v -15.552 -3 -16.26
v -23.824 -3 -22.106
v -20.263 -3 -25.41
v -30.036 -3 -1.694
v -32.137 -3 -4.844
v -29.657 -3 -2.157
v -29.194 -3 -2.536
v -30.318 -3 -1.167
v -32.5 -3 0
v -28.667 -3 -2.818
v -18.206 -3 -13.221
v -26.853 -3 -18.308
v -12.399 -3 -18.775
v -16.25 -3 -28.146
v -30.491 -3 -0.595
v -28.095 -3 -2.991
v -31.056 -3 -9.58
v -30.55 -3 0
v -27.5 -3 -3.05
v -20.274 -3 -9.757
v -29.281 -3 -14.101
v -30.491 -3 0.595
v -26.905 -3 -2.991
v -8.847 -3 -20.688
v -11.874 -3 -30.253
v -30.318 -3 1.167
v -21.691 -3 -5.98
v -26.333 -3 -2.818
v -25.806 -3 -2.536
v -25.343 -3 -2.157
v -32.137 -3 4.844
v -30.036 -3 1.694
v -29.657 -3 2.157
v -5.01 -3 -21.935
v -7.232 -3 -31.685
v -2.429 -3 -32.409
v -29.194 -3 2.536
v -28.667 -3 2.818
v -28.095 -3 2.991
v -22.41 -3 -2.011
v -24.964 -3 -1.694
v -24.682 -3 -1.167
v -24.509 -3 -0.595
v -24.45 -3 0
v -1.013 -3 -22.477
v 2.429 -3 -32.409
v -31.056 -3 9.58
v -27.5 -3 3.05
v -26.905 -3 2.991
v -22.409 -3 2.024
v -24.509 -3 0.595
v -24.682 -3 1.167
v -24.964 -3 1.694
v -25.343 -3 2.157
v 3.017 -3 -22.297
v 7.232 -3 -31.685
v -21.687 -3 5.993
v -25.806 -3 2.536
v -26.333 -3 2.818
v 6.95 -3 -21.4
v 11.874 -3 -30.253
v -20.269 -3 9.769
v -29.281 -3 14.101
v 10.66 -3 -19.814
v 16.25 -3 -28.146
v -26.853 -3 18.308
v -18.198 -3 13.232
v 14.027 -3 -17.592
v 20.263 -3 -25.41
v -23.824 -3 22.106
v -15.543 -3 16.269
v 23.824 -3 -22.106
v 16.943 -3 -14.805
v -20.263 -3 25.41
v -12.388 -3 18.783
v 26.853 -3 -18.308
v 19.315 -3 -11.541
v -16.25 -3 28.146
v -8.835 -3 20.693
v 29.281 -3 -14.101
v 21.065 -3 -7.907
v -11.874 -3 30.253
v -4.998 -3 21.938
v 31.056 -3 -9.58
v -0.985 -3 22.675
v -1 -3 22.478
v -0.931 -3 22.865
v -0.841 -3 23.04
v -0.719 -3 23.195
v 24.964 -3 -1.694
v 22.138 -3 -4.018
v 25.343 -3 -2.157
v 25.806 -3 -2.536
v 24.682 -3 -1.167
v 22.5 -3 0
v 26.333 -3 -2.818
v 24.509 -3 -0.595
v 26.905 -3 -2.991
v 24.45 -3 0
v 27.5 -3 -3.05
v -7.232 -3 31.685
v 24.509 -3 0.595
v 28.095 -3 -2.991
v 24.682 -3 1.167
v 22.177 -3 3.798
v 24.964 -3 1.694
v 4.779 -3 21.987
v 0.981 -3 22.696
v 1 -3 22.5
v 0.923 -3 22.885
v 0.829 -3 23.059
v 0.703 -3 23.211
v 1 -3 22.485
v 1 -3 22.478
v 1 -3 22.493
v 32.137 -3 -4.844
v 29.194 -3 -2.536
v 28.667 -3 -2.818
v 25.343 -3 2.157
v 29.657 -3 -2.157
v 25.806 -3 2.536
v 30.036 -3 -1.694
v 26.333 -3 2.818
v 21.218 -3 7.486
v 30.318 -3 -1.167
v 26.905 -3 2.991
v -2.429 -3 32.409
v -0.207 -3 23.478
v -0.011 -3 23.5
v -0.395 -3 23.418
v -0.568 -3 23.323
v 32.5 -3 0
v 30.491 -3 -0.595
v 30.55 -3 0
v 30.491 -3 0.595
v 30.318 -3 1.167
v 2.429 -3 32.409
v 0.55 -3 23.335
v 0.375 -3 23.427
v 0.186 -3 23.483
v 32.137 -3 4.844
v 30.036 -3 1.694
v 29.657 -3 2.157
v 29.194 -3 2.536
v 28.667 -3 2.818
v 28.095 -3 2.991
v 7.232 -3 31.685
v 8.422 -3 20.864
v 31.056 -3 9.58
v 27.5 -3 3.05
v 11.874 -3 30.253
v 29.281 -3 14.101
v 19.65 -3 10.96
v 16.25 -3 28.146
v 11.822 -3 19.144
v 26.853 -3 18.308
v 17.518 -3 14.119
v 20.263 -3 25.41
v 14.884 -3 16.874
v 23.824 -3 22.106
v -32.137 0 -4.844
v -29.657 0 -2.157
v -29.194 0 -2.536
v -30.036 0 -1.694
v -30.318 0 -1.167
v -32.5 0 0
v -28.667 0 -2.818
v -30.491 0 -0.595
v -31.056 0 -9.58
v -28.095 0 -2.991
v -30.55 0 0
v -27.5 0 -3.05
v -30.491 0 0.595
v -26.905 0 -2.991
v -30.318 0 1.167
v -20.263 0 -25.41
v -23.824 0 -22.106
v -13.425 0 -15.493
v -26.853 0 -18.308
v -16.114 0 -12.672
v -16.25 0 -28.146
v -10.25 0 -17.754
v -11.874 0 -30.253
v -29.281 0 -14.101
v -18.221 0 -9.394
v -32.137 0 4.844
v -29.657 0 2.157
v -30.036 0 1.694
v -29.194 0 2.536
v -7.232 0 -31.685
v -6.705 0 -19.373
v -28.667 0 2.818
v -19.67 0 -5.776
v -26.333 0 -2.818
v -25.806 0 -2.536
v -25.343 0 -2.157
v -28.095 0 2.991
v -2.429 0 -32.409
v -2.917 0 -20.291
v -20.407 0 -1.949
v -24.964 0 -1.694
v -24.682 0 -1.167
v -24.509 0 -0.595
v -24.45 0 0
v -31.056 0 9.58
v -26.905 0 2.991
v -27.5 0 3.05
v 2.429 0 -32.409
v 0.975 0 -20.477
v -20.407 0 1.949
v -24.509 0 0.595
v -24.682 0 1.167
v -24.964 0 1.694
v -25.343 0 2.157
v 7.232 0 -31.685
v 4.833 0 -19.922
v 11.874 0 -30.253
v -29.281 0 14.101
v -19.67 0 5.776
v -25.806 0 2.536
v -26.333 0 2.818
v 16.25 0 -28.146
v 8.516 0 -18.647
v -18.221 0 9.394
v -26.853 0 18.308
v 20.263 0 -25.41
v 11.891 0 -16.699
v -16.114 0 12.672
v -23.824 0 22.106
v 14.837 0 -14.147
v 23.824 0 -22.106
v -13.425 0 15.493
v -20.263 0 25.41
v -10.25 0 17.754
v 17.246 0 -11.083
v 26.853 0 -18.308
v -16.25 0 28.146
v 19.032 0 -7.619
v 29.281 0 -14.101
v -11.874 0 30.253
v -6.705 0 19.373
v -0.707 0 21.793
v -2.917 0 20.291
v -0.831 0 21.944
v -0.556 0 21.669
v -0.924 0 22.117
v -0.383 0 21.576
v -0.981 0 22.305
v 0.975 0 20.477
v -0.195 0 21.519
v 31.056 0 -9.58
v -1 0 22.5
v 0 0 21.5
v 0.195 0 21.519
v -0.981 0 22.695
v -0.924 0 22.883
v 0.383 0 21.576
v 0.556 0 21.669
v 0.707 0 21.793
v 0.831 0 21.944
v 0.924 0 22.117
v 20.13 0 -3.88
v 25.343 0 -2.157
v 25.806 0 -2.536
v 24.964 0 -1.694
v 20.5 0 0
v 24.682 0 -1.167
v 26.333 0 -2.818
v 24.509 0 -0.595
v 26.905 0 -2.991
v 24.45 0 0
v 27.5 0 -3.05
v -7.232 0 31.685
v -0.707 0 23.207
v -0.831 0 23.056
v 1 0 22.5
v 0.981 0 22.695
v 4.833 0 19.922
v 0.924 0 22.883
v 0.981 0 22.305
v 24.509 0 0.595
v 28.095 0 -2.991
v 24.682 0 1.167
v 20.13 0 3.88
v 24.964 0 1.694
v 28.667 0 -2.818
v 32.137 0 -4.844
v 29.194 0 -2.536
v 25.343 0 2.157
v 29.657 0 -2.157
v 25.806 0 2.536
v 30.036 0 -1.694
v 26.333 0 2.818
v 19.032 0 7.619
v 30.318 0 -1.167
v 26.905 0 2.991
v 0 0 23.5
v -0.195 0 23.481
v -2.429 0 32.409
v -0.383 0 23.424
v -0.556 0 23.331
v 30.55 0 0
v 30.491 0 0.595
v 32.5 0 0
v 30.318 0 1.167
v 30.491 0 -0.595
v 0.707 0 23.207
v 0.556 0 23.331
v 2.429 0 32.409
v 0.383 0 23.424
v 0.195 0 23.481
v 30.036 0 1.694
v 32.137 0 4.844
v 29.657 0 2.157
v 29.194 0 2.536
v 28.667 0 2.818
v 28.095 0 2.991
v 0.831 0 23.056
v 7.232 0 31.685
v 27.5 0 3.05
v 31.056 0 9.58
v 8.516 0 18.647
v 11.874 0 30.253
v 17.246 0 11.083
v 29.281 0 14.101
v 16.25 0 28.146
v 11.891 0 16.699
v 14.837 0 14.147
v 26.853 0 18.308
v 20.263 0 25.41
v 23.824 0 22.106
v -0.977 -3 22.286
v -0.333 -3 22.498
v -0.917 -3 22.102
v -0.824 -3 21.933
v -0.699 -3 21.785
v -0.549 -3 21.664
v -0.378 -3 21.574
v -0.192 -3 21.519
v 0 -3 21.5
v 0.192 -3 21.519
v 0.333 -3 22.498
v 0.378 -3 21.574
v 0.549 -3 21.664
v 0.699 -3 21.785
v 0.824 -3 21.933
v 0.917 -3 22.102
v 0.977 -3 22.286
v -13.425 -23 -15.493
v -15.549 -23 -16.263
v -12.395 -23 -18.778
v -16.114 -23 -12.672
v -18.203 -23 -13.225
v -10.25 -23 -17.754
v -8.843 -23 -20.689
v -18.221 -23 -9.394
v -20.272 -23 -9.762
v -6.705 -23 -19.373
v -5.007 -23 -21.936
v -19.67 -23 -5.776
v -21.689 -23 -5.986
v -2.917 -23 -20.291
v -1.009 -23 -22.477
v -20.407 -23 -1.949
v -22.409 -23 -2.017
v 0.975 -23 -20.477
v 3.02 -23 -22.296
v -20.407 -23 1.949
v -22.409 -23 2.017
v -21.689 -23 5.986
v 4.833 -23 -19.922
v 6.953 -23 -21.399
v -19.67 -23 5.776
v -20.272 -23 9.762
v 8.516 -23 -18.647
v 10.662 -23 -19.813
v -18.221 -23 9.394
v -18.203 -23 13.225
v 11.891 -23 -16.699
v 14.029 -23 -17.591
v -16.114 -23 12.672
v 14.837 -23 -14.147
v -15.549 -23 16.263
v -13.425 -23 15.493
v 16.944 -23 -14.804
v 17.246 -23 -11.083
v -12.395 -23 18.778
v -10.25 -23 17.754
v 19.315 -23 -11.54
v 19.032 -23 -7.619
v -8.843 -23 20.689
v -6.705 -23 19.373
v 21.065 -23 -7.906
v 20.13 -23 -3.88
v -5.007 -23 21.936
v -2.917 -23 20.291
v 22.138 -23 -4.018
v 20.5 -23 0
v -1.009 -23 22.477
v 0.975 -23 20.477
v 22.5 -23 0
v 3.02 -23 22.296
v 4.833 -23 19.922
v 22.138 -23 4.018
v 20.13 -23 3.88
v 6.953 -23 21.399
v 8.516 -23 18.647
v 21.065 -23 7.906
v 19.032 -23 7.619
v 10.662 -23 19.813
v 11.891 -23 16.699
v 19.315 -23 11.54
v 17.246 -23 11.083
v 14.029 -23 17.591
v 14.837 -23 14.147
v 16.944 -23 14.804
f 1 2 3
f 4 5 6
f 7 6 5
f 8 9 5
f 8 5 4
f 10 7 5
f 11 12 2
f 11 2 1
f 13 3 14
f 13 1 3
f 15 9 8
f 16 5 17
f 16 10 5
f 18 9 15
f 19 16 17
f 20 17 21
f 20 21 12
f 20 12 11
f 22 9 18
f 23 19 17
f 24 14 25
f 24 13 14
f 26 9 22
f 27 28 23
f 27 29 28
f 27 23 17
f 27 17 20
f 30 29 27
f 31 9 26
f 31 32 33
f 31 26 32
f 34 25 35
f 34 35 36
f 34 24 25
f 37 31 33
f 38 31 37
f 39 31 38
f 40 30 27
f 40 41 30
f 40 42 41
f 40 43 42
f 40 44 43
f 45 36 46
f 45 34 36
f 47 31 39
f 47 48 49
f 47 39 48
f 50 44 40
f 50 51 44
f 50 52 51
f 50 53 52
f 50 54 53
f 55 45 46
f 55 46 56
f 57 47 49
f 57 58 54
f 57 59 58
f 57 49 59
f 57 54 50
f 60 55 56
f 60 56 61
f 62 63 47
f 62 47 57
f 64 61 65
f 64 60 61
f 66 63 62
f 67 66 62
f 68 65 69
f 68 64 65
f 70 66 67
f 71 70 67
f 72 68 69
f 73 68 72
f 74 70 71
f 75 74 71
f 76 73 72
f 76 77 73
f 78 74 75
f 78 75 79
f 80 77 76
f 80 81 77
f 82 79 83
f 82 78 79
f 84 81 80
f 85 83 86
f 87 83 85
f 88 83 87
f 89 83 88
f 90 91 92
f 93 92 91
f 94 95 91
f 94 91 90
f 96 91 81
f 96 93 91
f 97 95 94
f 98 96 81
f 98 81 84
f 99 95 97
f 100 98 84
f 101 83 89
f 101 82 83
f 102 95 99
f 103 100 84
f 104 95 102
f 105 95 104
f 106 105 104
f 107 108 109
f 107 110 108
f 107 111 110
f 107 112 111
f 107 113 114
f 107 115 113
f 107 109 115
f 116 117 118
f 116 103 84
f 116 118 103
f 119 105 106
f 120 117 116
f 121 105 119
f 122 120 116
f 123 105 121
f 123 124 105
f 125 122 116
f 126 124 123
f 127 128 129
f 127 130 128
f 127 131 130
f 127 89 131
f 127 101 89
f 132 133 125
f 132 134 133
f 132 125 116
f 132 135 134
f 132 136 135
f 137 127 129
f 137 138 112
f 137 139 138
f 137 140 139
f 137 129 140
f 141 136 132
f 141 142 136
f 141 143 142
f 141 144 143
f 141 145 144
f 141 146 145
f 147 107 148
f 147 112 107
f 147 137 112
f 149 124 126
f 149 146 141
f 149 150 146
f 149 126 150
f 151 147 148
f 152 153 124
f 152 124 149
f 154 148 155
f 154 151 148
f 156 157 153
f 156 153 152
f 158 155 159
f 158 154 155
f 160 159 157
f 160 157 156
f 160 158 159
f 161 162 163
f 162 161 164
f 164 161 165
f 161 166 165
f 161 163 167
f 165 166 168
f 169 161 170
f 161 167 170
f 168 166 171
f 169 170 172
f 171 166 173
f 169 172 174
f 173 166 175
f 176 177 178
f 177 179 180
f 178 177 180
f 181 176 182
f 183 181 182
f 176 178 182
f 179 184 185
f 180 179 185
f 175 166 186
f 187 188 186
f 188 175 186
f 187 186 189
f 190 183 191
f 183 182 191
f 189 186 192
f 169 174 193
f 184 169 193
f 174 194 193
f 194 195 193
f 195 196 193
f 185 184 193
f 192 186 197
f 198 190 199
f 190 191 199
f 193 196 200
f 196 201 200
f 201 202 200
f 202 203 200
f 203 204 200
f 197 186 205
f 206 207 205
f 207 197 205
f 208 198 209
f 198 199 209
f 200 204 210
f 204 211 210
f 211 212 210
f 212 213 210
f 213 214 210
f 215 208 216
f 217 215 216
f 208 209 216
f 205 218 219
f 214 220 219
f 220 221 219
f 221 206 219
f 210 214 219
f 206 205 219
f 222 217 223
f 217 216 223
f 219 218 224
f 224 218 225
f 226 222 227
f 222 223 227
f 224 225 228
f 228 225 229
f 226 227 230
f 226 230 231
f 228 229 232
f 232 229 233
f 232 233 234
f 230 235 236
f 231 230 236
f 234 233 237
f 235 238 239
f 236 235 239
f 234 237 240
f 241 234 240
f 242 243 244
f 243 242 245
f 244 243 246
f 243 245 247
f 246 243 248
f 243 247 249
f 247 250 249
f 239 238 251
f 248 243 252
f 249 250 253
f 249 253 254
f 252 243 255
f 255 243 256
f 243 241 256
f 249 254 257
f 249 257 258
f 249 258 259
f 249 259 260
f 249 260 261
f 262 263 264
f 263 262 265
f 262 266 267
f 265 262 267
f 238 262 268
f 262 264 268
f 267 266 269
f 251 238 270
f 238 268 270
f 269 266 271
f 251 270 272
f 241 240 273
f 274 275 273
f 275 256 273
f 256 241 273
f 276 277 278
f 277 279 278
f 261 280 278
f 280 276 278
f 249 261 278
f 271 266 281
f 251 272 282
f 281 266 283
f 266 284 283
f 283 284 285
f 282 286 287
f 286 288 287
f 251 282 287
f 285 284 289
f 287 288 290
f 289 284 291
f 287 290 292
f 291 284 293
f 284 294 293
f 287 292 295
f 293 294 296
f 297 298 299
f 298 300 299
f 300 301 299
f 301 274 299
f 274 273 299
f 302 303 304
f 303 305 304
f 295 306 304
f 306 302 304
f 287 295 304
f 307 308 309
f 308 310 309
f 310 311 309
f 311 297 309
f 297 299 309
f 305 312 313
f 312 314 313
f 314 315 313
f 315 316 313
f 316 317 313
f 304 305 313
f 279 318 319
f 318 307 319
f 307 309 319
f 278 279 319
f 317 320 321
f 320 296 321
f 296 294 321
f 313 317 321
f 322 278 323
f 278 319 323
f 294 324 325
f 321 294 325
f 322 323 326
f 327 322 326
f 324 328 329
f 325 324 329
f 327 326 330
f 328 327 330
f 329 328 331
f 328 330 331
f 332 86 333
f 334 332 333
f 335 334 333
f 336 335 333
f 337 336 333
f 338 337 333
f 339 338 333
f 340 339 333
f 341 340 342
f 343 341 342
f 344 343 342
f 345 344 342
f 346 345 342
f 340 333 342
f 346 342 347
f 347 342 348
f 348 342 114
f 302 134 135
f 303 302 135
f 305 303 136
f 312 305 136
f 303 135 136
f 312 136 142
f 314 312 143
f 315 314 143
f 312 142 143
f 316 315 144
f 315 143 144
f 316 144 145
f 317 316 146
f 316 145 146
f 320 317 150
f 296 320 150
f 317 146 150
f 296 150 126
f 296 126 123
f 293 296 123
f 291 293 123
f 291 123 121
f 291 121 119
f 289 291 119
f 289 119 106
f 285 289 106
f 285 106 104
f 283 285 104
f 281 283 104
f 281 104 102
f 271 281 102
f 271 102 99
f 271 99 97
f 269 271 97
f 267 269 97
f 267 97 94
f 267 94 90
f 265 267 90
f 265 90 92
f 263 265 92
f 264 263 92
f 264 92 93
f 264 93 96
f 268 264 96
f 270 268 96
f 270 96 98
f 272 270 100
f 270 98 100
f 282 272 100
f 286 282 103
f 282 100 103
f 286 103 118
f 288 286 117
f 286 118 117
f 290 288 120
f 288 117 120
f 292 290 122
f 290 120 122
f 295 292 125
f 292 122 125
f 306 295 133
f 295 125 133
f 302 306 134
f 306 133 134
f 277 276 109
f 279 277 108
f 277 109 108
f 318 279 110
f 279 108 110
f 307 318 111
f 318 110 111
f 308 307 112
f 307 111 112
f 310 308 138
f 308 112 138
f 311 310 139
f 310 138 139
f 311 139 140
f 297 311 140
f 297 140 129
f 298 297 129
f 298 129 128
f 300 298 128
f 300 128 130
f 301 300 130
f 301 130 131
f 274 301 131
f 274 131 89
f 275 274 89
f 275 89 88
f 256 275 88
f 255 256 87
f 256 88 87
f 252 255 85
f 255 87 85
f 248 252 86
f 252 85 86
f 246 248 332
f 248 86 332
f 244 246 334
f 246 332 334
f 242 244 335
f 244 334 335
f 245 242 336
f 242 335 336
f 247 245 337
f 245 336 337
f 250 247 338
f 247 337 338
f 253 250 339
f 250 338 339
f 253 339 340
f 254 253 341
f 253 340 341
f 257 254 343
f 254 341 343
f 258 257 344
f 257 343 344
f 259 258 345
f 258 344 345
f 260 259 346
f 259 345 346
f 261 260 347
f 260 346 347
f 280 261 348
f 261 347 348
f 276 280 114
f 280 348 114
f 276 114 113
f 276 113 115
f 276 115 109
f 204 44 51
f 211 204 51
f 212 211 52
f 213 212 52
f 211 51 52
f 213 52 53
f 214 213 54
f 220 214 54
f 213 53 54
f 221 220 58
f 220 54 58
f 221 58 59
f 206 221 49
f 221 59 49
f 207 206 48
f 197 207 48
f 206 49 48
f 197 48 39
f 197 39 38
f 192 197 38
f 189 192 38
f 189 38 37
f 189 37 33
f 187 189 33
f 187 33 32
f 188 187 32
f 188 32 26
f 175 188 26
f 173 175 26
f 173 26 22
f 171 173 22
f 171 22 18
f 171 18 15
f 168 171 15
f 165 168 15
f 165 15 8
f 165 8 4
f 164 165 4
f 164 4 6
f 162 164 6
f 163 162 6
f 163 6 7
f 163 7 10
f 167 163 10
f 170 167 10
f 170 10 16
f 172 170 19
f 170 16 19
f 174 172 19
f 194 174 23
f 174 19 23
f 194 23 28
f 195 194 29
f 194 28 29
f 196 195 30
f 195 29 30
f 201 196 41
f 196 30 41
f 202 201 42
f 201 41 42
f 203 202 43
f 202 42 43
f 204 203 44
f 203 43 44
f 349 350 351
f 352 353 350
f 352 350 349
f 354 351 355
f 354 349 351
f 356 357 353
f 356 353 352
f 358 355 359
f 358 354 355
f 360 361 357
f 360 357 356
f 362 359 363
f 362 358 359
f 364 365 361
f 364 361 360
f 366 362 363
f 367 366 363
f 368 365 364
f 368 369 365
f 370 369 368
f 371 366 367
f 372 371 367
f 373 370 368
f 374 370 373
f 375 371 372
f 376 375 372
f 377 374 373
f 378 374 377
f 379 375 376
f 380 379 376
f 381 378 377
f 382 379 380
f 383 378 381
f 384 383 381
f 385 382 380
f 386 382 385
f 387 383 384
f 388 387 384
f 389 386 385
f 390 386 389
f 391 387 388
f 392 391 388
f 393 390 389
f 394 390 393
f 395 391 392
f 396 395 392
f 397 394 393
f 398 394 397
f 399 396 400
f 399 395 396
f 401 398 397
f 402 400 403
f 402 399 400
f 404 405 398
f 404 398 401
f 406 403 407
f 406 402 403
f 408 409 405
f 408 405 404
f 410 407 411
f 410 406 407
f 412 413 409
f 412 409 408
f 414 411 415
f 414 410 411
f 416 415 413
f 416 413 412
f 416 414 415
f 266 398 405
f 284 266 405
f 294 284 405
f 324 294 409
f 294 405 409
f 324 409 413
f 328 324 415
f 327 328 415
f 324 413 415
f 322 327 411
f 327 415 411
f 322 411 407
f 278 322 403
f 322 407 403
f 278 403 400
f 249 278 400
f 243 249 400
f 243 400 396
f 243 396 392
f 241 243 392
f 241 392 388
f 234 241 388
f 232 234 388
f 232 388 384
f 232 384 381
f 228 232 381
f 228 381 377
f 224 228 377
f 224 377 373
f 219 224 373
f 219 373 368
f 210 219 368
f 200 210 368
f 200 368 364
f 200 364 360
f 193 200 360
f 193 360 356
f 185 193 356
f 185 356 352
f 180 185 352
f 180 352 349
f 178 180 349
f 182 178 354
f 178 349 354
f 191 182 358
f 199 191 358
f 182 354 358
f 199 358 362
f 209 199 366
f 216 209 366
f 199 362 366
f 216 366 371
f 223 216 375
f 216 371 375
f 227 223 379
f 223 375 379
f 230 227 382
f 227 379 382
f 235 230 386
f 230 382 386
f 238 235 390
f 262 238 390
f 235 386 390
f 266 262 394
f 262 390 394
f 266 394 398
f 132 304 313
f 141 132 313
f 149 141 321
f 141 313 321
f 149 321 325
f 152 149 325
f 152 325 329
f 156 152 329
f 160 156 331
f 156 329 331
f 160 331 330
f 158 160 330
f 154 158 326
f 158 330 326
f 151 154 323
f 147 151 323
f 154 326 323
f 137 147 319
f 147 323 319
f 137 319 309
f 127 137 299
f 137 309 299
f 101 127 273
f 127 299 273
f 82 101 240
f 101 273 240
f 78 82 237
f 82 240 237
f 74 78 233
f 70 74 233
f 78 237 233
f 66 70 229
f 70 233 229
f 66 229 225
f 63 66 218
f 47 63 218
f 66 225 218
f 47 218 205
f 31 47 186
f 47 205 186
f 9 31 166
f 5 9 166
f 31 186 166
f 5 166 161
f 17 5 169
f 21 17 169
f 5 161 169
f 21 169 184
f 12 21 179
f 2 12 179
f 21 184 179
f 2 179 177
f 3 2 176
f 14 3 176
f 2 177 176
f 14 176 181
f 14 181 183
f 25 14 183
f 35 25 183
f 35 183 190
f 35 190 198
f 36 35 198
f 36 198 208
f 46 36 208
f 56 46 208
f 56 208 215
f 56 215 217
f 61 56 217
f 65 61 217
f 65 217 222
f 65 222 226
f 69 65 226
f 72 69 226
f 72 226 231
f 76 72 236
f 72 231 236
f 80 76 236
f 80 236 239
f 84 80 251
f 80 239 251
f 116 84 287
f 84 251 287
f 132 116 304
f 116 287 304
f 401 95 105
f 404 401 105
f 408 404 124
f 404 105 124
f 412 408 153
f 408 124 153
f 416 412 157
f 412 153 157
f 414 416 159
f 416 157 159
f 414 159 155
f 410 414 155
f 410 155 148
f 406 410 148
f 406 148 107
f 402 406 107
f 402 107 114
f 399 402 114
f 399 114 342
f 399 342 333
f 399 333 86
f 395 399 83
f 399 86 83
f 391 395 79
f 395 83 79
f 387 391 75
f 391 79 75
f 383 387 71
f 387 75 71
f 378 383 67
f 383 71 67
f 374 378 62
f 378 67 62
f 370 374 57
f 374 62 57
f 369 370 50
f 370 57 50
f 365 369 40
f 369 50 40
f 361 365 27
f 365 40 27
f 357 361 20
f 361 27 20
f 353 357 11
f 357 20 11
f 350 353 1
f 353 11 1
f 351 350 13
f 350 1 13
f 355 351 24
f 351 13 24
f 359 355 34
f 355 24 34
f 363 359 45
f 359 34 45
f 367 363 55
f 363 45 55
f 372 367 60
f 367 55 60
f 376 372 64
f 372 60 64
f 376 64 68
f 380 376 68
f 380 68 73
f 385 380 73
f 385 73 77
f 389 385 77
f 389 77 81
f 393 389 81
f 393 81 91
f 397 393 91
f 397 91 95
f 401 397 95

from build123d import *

# Parameters (mm, degrees)
F0_R     = 32.5
F1_DEPTH = 3
F2_R     = 22.5
F3_DEPTH = 20
F4_R     = 20.5
F5_DEPTH = 23.001
F6_R     = 3.05
F6_R_2   = 1
F7_DEPTH = 3.001


with BuildPart() as f1:
    # F0 (on Front) → F1 (new body)
    with BuildSketch(Plane.XZ):
        Circle(F0_R)
    extrude(amount=F1_DEPTH)

    # F2 (on face) → F3 (join)
    with BuildSketch(Plane.XZ.offset(3)):
        Circle(F2_R)
    extrude(amount=F3_DEPTH)

    # F4 (on face) → F5 (cut, through all)
    with BuildSketch(Plane.XZ.offset(23)):
        Circle(F4_R)
    extrude(amount=-F5_DEPTH, mode=Mode.SUBTRACT)

    # F6 (on face) → F7 (cut, through all)
    with BuildSketch(Plane.XZ.offset(3)):
        with Locations((27.5, 0)):
            Circle(F6_R)
        with Locations((-27.5, 0)):
            Circle(F6_R)
        with Locations((0, 22.5)):
            Circle(F6_R_2)
    extrude(amount=-F7_DEPTH, mode=Mode.SUBTRACT)


solid = f1.part
